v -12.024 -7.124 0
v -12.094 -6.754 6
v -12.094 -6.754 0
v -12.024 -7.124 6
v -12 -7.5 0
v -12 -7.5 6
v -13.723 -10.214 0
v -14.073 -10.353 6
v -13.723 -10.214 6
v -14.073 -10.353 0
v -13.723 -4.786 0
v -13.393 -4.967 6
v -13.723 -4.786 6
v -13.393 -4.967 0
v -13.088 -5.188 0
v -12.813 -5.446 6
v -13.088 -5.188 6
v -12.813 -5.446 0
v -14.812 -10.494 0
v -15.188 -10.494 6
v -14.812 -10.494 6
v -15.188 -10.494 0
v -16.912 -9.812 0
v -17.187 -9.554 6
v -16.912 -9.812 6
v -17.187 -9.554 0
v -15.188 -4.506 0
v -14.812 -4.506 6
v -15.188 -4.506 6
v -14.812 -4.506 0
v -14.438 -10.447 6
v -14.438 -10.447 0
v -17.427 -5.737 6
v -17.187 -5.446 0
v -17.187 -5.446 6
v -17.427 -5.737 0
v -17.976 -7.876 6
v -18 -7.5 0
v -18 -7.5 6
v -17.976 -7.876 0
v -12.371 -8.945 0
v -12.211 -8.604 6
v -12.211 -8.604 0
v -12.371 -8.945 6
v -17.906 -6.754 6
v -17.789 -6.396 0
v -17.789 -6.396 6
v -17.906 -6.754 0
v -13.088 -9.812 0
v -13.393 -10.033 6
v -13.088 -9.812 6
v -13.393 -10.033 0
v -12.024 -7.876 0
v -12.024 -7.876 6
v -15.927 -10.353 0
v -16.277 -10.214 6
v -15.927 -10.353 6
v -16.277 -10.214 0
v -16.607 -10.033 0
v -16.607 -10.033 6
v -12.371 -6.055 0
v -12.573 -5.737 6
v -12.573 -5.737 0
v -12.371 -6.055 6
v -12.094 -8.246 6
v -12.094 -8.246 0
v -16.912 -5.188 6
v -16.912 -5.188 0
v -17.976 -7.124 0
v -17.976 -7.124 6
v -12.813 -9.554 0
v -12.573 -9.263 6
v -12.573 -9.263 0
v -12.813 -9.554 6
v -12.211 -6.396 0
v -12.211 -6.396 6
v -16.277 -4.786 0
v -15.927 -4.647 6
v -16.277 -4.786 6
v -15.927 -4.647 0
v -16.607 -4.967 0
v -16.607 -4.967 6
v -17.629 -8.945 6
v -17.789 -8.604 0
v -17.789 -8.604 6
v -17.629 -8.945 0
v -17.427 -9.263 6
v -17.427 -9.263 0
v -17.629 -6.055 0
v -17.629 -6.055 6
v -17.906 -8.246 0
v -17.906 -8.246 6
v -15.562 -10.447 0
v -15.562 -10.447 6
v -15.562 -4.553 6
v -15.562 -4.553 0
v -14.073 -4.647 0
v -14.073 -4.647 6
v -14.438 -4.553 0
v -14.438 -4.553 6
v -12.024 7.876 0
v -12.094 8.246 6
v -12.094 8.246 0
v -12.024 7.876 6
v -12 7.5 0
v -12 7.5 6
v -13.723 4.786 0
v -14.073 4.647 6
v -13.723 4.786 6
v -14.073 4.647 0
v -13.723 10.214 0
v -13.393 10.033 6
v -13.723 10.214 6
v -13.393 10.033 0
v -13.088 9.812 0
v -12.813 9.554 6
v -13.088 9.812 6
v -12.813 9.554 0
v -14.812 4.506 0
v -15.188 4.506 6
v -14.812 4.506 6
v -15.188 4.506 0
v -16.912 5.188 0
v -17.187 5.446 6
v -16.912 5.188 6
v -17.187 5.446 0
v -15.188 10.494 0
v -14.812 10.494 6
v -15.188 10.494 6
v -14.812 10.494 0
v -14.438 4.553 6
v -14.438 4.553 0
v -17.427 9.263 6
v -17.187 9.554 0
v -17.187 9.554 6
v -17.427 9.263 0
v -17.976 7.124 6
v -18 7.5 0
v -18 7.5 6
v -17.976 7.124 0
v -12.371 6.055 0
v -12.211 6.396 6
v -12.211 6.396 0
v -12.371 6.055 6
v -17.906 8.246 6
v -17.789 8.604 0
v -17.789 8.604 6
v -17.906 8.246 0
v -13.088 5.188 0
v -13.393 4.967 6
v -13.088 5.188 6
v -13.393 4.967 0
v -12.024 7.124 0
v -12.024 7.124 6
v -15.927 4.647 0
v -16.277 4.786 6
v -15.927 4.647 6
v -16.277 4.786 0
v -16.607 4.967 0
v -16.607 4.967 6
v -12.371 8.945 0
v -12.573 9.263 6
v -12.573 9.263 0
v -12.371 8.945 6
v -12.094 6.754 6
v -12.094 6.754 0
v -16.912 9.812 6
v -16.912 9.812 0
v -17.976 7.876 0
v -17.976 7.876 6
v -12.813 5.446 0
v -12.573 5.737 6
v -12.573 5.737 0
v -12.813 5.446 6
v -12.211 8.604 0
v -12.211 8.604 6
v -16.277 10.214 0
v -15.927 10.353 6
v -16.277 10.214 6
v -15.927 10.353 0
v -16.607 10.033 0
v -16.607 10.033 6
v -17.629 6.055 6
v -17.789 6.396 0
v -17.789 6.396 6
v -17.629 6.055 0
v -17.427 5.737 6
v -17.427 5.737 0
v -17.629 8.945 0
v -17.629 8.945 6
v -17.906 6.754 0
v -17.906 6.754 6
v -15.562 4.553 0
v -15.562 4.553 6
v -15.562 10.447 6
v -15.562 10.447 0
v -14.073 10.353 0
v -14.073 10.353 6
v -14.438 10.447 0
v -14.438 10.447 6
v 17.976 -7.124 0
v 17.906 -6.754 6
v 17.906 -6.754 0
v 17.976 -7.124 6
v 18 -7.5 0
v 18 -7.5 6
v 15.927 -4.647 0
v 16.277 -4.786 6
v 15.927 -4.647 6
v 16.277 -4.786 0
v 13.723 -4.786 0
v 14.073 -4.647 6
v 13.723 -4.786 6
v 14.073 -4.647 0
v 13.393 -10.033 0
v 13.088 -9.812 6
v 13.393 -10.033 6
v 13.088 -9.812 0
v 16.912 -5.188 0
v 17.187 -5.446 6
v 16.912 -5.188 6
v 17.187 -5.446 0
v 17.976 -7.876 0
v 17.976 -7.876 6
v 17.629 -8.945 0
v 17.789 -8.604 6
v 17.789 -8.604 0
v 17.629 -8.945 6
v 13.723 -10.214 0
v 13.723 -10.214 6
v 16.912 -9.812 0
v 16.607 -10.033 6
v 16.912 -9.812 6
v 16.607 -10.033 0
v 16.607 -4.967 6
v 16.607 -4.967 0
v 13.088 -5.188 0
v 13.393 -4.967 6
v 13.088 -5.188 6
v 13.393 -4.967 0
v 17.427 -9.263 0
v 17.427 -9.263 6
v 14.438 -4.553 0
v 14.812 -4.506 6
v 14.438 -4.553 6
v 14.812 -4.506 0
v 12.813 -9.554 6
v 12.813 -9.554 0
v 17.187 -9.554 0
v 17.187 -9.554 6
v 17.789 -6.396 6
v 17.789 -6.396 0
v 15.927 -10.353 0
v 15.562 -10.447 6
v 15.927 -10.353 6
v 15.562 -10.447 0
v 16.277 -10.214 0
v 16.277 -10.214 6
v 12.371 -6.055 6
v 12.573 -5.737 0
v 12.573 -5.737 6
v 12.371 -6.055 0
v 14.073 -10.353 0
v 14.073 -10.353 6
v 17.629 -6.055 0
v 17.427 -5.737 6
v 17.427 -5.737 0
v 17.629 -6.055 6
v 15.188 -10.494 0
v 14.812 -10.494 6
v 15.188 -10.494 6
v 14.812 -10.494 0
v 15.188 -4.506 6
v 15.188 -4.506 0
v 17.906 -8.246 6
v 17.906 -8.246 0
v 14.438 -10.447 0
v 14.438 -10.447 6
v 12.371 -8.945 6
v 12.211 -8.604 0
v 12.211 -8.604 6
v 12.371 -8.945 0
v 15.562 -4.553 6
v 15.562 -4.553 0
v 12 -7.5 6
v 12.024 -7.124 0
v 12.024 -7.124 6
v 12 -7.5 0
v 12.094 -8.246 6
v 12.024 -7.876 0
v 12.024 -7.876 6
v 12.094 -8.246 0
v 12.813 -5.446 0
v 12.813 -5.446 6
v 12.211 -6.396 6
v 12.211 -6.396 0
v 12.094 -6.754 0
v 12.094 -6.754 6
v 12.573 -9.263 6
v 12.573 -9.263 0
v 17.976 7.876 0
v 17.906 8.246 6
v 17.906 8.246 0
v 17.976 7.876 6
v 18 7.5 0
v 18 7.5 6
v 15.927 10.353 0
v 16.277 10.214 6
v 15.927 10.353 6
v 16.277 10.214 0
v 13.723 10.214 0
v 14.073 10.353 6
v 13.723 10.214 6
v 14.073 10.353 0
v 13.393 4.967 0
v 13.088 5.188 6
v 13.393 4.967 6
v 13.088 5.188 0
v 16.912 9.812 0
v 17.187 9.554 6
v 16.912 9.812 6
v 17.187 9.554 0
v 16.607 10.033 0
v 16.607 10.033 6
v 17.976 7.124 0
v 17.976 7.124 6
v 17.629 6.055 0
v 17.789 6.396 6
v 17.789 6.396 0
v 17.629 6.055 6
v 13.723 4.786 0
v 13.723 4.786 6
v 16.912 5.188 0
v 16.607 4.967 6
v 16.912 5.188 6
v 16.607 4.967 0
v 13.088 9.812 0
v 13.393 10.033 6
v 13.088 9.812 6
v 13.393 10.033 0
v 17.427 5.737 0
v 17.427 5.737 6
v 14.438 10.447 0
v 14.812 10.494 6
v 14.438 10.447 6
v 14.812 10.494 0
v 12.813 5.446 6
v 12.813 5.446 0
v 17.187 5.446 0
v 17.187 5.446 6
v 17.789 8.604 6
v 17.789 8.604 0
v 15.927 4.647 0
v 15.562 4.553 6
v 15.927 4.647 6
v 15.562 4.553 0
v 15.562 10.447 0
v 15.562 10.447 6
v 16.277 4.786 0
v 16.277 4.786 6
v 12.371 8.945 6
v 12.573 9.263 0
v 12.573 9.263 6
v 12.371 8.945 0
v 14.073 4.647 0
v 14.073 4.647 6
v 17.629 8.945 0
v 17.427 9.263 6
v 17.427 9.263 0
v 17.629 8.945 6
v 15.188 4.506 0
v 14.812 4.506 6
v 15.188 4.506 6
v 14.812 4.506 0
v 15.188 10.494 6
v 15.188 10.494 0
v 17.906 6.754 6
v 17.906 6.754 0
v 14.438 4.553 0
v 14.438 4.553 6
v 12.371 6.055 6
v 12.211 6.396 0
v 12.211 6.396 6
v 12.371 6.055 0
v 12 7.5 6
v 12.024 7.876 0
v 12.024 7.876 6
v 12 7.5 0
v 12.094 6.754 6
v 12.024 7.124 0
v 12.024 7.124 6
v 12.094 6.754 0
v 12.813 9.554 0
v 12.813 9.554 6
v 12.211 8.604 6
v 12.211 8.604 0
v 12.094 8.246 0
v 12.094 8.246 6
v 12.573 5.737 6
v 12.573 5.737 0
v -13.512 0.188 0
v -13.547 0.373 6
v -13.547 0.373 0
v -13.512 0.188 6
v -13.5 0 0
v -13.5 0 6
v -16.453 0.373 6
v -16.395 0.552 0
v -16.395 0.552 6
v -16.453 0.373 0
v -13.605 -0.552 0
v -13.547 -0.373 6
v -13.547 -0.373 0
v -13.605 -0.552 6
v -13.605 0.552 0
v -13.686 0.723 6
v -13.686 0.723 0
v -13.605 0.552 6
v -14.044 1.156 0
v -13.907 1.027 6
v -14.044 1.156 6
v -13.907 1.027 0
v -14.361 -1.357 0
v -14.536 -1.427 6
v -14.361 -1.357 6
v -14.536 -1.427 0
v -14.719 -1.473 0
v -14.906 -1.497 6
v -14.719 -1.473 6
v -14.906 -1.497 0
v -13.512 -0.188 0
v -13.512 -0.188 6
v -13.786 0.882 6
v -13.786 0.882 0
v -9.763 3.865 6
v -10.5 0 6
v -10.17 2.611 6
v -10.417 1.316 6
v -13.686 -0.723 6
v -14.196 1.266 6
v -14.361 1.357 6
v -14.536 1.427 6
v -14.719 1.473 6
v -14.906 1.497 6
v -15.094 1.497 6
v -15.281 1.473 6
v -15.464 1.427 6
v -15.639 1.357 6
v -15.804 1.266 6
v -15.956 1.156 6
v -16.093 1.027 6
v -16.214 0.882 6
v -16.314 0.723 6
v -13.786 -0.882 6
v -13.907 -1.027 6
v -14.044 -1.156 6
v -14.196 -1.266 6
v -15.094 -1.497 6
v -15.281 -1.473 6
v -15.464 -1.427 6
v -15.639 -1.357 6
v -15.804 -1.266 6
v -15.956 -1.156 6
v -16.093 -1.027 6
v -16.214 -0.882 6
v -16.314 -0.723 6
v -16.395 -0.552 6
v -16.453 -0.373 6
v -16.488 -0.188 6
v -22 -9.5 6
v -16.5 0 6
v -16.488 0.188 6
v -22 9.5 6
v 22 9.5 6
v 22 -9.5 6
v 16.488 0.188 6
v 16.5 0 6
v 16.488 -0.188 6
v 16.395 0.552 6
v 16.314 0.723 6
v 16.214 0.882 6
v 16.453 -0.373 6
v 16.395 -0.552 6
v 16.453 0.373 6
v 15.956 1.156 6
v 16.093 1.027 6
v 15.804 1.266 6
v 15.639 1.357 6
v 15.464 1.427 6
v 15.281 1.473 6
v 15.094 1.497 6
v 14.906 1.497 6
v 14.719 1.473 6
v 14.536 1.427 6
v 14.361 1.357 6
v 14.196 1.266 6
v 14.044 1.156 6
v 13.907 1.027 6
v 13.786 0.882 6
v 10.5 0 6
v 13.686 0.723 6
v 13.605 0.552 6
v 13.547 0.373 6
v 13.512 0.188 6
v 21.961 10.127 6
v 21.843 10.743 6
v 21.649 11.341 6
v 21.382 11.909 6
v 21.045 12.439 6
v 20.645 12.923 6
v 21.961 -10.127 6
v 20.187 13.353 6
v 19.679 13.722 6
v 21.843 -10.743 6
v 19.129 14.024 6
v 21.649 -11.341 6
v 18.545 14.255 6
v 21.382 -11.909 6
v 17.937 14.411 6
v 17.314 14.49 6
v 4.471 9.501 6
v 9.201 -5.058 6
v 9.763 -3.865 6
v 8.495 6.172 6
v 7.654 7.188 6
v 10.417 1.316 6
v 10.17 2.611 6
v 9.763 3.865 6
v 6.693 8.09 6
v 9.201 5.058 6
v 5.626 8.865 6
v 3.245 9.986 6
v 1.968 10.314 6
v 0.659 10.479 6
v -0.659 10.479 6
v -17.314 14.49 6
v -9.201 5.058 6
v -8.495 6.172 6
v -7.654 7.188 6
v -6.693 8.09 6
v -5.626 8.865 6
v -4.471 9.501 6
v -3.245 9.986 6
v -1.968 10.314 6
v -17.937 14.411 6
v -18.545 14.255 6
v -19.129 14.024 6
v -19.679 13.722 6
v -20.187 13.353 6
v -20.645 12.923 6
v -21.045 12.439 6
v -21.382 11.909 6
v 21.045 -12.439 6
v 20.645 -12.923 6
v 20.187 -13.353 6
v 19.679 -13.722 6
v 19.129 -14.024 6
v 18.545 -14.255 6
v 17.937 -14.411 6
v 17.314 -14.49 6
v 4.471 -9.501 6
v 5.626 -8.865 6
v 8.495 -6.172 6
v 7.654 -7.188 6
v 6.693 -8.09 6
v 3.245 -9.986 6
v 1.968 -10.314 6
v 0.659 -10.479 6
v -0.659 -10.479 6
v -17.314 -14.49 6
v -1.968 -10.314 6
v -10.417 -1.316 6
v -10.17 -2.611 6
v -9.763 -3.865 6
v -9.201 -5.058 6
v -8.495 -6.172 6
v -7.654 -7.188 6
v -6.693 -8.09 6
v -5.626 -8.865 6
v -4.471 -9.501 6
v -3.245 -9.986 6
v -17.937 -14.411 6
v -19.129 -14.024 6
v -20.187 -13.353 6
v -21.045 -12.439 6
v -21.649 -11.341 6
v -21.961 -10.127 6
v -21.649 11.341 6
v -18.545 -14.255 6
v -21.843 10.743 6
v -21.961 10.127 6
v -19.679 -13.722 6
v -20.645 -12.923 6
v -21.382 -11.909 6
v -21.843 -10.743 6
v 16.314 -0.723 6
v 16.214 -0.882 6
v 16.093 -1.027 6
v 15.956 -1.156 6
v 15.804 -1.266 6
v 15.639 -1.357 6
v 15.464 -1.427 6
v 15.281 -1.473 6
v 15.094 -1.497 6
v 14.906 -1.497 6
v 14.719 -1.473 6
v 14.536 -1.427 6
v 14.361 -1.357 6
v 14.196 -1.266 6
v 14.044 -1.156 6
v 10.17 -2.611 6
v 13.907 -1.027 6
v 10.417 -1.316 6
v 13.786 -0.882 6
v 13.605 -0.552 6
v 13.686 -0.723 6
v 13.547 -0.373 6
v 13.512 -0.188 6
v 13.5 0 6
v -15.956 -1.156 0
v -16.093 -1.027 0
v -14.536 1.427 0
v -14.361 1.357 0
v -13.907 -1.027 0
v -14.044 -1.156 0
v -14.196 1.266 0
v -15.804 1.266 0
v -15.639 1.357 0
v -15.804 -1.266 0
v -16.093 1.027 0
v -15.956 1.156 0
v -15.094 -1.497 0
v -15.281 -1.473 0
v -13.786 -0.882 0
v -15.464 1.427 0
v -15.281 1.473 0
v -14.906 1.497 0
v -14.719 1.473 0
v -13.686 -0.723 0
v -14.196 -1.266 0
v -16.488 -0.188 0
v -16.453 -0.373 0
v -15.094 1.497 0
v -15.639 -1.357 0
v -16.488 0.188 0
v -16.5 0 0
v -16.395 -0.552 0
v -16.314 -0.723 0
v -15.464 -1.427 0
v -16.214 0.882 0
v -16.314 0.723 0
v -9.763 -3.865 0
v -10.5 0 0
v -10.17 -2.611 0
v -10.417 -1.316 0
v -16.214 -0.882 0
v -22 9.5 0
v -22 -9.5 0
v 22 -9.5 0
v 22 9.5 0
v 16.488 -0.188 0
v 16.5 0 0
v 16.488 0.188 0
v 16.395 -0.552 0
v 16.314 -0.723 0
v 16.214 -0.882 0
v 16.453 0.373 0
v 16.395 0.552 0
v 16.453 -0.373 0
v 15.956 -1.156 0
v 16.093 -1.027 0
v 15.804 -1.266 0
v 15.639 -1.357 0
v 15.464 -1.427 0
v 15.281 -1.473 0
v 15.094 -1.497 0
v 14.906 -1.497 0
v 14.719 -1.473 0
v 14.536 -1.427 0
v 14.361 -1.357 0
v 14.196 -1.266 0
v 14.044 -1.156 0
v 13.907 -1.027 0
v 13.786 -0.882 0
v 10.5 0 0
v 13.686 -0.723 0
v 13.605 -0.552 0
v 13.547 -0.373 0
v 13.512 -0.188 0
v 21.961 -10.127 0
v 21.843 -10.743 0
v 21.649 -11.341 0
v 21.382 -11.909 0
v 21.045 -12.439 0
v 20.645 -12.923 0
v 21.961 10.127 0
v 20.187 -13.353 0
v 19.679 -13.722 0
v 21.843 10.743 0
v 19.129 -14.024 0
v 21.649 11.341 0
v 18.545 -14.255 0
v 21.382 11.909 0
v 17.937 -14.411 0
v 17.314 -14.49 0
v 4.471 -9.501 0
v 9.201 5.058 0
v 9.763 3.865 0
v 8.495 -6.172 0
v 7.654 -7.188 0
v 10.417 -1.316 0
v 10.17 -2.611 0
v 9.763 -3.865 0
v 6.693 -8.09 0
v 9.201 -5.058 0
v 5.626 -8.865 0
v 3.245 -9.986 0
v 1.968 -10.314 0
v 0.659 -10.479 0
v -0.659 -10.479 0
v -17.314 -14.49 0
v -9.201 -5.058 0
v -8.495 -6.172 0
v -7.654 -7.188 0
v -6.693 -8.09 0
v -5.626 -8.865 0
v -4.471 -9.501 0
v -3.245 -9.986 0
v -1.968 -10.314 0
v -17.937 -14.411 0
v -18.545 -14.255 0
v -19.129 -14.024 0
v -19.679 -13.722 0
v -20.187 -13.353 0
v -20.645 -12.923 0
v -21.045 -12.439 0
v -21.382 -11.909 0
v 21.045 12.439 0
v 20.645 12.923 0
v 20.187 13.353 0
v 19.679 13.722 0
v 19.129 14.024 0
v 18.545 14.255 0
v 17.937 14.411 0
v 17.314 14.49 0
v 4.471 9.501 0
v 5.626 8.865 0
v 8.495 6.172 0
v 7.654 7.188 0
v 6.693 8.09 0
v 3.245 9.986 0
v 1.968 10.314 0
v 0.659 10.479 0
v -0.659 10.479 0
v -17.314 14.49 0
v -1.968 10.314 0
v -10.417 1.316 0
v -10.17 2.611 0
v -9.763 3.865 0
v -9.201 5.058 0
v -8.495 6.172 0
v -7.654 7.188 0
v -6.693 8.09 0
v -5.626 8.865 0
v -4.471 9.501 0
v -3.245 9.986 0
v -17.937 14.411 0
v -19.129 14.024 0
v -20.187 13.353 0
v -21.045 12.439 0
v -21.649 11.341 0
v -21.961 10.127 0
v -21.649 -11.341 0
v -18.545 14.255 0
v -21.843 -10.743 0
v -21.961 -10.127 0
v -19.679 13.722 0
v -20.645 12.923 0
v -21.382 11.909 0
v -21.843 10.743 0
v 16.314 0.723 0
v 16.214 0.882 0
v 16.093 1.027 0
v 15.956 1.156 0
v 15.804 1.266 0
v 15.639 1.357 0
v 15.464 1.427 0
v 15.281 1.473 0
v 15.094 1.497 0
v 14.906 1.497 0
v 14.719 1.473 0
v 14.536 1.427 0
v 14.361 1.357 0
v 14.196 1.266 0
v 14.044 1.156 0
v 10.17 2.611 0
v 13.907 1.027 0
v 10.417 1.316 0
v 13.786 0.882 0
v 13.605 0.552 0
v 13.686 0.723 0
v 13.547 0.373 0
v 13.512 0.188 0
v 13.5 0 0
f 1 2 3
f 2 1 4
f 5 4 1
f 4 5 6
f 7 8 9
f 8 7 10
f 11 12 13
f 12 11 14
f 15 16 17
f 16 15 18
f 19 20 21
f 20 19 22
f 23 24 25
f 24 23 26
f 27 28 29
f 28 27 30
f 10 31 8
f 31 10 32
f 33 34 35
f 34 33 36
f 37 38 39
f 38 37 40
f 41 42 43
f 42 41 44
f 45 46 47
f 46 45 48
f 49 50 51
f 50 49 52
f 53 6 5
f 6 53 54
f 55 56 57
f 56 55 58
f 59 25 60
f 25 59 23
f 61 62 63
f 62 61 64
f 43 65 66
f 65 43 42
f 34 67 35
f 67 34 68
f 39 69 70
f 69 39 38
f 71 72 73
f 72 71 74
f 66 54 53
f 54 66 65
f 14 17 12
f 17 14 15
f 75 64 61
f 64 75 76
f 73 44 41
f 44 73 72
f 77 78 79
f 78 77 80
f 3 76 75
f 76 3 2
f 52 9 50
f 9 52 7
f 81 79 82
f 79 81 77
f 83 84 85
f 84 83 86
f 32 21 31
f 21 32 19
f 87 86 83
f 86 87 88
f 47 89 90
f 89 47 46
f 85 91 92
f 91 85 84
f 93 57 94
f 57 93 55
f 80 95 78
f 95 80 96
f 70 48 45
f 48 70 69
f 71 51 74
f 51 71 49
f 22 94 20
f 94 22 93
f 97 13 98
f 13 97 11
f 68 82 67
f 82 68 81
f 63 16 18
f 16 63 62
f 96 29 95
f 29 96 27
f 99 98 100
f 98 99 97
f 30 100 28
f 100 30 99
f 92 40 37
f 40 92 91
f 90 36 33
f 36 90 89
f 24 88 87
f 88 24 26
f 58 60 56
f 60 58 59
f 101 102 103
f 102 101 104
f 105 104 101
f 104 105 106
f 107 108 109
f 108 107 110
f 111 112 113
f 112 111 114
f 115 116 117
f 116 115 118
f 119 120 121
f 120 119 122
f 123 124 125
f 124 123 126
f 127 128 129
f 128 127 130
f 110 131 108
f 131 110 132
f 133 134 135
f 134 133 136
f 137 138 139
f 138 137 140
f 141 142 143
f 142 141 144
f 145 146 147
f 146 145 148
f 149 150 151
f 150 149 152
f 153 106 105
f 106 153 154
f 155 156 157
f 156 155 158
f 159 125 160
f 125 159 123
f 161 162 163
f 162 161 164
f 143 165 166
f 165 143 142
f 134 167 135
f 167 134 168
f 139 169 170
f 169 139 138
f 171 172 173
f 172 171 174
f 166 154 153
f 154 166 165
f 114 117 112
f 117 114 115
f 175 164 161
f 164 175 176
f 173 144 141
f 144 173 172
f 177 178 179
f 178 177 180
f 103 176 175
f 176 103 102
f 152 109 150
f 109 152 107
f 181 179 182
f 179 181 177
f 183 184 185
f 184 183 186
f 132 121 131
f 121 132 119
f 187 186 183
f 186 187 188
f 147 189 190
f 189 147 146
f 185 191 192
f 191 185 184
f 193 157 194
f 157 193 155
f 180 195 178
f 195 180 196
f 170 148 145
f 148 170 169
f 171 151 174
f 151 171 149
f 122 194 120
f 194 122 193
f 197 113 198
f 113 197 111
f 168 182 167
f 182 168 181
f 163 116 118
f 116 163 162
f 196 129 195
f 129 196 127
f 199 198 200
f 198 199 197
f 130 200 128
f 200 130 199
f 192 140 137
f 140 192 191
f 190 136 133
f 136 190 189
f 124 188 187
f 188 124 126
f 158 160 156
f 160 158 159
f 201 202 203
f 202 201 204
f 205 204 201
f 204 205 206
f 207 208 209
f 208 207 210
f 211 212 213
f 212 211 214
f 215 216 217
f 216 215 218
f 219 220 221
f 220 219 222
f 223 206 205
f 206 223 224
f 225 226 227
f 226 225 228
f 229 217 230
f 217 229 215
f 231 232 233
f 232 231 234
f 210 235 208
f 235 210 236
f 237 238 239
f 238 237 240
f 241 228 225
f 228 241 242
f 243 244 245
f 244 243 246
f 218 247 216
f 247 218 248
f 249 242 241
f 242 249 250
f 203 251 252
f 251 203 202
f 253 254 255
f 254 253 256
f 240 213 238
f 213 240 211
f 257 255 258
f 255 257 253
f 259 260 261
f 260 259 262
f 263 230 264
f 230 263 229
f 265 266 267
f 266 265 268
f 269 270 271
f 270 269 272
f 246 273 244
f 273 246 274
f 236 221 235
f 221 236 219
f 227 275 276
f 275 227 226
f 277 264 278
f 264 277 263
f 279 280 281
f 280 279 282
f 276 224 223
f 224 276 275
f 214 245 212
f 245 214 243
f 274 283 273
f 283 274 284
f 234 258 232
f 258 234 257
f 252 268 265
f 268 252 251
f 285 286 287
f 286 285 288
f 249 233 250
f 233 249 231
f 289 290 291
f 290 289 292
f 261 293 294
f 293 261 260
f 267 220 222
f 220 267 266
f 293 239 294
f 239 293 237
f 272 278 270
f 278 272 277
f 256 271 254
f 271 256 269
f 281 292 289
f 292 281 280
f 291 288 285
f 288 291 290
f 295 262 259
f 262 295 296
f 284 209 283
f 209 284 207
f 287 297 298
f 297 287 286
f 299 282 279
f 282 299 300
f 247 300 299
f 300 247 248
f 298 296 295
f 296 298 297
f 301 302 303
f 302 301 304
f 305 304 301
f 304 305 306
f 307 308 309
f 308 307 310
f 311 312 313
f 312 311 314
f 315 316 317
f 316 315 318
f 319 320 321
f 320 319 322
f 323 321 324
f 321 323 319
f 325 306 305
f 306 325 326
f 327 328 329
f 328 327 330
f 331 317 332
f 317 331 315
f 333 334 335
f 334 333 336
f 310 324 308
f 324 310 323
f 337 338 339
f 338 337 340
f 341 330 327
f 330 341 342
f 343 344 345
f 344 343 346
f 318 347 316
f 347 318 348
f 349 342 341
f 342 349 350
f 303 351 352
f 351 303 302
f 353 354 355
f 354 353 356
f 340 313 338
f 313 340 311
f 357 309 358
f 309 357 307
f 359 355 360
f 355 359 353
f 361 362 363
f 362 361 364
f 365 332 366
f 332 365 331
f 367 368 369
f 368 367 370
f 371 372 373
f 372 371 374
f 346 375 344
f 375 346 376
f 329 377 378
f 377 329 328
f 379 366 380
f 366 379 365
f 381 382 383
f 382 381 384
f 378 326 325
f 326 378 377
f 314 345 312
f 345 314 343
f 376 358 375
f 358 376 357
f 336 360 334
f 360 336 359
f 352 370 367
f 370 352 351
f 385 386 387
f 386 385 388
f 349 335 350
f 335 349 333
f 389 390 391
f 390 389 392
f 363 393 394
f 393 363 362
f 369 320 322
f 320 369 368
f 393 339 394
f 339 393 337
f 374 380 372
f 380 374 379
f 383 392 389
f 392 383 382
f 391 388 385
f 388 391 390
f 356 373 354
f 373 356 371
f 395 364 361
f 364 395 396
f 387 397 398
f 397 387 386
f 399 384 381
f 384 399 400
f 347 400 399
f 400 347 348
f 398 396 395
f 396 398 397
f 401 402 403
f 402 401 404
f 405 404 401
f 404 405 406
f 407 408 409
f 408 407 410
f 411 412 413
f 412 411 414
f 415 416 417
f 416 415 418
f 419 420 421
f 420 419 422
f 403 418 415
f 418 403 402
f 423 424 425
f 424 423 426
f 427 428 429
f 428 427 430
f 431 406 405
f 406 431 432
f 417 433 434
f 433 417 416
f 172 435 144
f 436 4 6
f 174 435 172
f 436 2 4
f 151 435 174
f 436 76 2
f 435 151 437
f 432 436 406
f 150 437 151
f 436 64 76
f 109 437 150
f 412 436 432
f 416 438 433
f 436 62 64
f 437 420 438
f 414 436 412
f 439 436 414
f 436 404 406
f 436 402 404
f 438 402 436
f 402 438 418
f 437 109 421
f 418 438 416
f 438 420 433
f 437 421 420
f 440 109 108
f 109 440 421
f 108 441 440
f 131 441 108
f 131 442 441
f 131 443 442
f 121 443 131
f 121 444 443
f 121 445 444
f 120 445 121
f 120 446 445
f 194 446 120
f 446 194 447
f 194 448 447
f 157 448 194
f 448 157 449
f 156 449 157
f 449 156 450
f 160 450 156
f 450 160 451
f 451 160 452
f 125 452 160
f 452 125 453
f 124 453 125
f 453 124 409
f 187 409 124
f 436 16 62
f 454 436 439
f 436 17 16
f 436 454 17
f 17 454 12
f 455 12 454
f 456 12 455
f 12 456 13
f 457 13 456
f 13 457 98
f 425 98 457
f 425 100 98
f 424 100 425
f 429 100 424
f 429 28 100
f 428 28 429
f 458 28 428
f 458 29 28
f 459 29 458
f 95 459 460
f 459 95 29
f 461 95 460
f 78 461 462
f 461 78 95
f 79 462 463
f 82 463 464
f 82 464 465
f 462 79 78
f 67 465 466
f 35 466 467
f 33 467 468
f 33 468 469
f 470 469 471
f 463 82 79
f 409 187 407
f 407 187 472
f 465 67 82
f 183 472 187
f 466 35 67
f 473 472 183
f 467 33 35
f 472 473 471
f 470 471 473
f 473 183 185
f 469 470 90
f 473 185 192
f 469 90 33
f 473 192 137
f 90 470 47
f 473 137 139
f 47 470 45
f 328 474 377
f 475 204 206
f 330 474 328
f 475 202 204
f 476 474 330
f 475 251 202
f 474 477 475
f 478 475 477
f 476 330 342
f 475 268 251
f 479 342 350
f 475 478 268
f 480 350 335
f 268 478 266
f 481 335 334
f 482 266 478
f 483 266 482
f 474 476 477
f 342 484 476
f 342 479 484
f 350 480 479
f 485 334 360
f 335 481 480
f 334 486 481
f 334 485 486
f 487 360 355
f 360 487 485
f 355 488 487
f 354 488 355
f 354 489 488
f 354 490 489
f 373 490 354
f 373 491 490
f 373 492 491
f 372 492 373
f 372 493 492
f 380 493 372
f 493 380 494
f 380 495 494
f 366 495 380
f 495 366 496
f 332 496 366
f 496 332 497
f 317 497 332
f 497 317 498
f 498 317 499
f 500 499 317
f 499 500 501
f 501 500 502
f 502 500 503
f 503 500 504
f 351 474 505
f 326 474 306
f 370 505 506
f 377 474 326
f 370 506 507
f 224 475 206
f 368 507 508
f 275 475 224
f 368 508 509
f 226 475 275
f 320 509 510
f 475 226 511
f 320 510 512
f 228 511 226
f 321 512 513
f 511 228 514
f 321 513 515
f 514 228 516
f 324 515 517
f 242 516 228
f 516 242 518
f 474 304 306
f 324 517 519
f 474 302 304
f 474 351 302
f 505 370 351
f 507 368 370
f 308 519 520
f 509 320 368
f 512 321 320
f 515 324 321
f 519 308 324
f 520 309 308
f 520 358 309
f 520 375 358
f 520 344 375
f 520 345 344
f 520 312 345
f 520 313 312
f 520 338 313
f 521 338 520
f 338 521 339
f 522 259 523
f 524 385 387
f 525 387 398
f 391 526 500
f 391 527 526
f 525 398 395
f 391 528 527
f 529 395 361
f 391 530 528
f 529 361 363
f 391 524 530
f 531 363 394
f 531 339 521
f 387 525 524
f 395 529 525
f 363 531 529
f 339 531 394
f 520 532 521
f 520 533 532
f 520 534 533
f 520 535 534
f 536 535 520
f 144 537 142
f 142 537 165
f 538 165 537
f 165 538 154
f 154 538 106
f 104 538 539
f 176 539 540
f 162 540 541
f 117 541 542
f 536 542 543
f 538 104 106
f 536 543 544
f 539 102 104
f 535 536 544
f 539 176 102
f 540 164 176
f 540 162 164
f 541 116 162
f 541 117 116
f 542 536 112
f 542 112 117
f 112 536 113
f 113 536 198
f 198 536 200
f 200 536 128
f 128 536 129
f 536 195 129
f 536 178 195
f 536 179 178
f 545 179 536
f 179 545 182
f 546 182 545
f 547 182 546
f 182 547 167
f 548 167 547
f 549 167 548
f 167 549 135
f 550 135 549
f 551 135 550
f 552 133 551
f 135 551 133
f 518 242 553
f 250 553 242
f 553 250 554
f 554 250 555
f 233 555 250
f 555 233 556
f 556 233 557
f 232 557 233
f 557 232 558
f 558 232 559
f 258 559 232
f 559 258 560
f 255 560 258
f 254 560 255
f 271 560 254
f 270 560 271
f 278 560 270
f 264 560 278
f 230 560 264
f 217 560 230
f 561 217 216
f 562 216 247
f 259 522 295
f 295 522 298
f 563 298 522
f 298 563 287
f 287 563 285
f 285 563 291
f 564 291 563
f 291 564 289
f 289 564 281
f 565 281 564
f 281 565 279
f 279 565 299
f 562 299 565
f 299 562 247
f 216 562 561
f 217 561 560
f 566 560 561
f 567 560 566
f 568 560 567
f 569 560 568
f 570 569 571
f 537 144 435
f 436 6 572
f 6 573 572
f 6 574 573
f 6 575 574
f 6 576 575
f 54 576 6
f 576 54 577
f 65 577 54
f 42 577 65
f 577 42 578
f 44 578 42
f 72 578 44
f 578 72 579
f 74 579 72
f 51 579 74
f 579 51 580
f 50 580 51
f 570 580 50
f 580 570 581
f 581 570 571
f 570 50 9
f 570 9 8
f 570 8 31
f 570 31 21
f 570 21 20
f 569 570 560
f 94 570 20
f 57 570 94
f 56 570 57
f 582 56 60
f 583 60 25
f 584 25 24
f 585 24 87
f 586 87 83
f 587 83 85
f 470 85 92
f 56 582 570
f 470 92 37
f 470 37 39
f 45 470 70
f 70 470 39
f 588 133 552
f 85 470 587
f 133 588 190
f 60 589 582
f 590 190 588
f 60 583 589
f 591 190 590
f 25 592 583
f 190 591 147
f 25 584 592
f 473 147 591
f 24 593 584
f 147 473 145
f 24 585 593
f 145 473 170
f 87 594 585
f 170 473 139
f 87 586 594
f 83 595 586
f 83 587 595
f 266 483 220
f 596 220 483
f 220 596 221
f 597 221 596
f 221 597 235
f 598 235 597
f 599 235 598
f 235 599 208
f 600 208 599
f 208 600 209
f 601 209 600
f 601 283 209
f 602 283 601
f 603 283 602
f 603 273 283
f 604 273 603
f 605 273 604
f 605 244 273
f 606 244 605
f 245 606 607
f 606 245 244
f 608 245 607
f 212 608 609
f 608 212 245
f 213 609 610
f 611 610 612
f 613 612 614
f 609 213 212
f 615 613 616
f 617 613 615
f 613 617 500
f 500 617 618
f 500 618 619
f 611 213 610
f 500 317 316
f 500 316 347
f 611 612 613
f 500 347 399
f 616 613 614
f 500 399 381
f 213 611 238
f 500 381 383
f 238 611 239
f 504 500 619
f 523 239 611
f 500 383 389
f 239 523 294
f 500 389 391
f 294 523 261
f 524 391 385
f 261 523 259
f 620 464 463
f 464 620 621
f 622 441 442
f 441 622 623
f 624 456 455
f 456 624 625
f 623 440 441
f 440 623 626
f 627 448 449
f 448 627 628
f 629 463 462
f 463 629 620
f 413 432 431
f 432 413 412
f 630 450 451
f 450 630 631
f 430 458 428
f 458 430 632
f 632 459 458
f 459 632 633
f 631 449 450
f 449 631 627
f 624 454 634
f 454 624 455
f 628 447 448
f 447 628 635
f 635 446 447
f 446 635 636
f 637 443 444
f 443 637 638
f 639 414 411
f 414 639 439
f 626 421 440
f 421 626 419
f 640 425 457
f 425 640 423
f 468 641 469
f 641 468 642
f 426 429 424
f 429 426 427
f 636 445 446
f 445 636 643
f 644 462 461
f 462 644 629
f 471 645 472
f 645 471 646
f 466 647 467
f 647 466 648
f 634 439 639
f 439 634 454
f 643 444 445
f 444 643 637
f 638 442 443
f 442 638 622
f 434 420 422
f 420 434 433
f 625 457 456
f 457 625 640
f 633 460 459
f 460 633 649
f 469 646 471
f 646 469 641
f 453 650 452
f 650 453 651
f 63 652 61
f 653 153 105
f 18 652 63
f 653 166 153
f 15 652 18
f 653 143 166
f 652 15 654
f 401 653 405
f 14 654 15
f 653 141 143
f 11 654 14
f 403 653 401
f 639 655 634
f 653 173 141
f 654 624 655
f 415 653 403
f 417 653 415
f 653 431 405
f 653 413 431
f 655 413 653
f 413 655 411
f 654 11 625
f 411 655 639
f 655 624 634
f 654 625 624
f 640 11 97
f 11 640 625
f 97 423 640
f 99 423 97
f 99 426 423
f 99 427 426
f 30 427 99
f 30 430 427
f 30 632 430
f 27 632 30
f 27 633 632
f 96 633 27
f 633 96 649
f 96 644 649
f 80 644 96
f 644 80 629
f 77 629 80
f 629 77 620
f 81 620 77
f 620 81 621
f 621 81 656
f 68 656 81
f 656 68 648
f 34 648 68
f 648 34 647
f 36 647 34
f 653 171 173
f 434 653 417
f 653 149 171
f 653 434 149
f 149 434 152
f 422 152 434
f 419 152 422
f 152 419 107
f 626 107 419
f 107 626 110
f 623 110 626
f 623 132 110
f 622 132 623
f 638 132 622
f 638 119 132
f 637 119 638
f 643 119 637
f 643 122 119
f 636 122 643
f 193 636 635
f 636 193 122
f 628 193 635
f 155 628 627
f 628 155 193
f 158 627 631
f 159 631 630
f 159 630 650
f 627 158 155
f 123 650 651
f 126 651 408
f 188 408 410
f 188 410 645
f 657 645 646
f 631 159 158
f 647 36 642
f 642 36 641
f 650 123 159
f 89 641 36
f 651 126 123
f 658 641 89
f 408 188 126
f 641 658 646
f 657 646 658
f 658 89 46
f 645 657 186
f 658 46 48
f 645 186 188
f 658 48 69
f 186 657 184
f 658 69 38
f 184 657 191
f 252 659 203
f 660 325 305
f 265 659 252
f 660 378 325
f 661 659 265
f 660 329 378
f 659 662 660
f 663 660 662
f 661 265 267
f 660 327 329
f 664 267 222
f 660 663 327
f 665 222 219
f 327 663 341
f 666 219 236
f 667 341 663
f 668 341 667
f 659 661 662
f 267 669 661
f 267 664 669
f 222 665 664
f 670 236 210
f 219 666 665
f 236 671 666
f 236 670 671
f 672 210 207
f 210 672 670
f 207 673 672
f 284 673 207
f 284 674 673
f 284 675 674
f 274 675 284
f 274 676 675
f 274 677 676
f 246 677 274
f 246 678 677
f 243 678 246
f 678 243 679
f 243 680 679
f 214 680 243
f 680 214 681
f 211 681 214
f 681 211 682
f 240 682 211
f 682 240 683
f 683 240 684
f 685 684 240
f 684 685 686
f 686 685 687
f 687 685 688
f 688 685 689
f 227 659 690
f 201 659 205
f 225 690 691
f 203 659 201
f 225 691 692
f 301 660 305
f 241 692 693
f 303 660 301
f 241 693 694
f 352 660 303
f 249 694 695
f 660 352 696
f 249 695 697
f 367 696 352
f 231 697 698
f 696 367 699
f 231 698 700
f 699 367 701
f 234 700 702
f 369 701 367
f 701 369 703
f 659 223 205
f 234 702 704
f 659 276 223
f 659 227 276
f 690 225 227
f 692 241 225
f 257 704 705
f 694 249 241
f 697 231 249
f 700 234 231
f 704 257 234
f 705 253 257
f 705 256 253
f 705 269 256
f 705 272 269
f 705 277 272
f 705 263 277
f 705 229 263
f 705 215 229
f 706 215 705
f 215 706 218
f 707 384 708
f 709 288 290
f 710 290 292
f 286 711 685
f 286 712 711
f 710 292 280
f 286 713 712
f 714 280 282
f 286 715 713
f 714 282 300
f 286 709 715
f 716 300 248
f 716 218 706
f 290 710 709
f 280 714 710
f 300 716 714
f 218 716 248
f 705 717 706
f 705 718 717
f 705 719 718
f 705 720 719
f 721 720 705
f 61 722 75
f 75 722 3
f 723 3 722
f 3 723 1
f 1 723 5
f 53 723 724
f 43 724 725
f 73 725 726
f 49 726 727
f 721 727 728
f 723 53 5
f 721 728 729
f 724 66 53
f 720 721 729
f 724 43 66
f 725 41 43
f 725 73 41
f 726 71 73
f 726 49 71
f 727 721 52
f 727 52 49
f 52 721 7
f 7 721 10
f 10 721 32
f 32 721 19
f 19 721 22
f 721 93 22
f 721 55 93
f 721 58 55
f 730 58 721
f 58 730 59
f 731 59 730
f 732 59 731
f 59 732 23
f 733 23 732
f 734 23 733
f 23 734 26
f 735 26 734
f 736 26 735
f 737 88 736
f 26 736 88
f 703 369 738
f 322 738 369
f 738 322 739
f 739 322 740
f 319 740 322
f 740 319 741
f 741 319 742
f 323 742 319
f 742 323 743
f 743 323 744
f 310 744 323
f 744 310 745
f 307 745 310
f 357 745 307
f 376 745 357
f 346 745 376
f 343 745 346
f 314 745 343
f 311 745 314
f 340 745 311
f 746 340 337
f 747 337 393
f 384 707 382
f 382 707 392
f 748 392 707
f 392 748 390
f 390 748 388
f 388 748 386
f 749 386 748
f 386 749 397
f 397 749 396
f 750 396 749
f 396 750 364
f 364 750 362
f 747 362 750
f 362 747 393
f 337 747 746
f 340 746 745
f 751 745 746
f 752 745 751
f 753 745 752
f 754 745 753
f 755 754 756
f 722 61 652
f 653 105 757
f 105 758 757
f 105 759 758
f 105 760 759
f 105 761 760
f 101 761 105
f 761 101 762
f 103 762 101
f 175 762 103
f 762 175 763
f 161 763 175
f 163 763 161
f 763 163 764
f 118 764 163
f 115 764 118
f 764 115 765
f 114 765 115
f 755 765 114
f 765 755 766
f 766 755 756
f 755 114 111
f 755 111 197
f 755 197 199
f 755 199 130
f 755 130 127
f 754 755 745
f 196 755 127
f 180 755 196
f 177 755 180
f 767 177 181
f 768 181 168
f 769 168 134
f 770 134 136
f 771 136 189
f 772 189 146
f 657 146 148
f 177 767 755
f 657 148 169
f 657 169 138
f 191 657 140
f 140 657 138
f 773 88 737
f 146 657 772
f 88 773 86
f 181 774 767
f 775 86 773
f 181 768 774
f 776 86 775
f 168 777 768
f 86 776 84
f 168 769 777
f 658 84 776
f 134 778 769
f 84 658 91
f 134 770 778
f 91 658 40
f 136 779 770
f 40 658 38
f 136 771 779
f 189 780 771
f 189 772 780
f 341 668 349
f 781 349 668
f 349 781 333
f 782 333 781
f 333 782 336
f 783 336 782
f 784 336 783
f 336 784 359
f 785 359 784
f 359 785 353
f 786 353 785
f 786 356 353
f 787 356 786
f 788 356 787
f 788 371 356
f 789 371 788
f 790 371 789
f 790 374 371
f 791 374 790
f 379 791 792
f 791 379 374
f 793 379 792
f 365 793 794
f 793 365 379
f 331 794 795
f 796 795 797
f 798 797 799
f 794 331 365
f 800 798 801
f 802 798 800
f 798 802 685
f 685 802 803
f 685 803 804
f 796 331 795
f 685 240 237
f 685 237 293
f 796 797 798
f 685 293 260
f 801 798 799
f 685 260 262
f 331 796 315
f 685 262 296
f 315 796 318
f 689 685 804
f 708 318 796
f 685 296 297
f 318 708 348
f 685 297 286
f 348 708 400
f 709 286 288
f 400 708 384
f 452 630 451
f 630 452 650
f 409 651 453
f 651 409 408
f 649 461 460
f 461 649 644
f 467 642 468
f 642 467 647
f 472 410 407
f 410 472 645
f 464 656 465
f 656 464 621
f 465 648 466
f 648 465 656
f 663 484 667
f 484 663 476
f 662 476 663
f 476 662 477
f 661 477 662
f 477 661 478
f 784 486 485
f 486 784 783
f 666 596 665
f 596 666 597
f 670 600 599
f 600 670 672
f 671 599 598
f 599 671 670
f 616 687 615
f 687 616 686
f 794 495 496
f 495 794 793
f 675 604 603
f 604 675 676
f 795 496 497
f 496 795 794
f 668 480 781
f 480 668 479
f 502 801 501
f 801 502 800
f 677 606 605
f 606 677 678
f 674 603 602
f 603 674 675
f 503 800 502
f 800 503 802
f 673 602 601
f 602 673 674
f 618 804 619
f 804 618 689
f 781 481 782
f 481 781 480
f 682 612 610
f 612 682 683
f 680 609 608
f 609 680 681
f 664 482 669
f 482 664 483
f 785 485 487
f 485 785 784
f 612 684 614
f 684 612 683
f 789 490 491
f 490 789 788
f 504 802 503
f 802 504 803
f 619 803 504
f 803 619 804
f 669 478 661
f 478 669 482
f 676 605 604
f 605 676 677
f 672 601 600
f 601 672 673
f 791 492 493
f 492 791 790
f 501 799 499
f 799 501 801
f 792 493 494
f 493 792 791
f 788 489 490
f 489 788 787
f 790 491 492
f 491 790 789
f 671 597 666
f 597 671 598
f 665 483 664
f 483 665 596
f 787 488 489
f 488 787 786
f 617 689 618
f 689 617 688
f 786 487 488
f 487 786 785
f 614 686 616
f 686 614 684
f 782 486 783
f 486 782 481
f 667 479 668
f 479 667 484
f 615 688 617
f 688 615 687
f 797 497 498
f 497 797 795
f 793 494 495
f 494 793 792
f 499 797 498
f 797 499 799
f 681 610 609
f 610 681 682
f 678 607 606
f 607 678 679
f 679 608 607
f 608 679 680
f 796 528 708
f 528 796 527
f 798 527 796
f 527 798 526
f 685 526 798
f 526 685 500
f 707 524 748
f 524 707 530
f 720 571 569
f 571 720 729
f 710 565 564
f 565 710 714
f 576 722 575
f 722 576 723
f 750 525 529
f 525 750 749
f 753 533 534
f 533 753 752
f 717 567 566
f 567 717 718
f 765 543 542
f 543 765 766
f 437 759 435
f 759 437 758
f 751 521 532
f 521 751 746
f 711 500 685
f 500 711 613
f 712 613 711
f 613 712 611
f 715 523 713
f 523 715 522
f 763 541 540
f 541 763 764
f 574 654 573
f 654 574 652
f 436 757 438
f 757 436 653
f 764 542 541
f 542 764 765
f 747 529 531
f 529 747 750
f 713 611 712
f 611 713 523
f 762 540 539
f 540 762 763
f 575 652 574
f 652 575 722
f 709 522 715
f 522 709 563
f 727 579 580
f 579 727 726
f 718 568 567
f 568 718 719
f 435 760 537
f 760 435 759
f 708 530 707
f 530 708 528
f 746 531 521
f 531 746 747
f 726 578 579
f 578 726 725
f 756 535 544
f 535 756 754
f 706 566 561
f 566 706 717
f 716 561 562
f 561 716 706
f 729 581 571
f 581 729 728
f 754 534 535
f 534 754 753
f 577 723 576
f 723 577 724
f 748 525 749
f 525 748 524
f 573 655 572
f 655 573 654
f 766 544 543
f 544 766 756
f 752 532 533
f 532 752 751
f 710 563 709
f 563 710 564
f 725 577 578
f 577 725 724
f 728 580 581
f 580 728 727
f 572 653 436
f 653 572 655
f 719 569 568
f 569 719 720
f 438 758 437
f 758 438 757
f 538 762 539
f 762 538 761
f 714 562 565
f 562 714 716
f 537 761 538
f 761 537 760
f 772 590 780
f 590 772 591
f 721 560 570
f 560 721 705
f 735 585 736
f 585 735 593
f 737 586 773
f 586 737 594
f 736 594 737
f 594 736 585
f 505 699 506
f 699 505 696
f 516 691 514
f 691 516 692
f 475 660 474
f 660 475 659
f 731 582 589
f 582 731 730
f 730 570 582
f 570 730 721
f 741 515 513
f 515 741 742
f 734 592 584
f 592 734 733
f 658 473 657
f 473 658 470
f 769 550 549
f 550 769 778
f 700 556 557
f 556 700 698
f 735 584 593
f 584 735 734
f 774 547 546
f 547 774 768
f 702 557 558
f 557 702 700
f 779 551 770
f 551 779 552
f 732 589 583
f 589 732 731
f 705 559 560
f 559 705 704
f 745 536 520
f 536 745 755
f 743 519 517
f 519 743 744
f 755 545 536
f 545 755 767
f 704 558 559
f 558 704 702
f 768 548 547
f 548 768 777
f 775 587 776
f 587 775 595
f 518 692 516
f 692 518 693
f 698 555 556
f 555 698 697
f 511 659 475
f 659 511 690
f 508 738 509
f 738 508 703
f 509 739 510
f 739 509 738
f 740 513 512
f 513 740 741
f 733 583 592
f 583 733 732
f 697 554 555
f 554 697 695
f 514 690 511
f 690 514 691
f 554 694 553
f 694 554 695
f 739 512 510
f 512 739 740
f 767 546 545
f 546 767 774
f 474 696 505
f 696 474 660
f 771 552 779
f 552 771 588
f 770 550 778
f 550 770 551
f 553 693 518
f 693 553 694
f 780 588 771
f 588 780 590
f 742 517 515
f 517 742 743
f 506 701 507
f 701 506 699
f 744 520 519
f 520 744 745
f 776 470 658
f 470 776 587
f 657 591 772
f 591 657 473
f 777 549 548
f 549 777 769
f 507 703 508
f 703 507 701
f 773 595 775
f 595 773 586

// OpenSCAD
$fn = 50;


difference() {
	union() {
		hull() {
			translate(v = [-17.0000000000, 9.5000000000, 0]) {
				cylinder(h = 6, r = 5);
			}
			translate(v = [17.0000000000, 9.5000000000, 0]) {
				cylinder(h = 6, r = 5);
			}
			translate(v = [-17.0000000000, -9.5000000000, 0]) {
				cylinder(h = 6, r = 5);
			}
			translate(v = [17.0000000000, -9.5000000000, 0]) {
				cylinder(h = 6, r = 5);
			}
		}
	}
	union() {
		#translate(v = [-15.0000000000, -7.5000000000, 0]) {
			cylinder(h = 6, r = 3.0000000000);
		}
		#translate(v = [-15.0000000000, 7.5000000000, 0]) {
			cylinder(h = 6, r = 3.0000000000);
		}
		#translate(v = [15.0000000000, -7.5000000000, 0]) {
			cylinder(h = 6, r = 3.0000000000);
		}
		#translate(v = [15.0000000000, 7.5000000000, 0]) {
			cylinder(h = 6, r = 3.0000000000);
		}
		#translate(v = [-15.0000000000, -7.5000000000, -100.0000000000]) {
			cylinder(h = 200, r = 3.0000000000);
		}
		#translate(v = [-15.0000000000, 7.5000000000, -100.0000000000]) {
			cylinder(h = 200, r = 3.0000000000);
		}
		#translate(v = [15.0000000000, -7.5000000000, -100.0000000000]) {
			cylinder(h = 200, r = 3.0000000000);
		}
		#translate(v = [15.0000000000, 7.5000000000, -100.0000000000]) {
			cylinder(h = 200, r = 3.0000000000);
		}
		#translate(v = [-15.0000000000, -7.5000000000, 0]) {
			cylinder(h = 6, r = 1.5000000000);
		}
		#translate(v = [-15.0000000000, 0.0000000000, 0]) {
			cylinder(h = 6, r = 1.5000000000);
		}
		#translate(v = [-15.0000000000, 7.5000000000, 0]) {
			cylinder(h = 6, r = 1.5000000000);
		}
		#translate(v = [15.0000000000, -7.5000000000, 0]) {
			cylinder(h = 6, r = 1.5000000000);
		}
		#translate(v = [15.0000000000, 0.0000000000, 0]) {
			cylinder(h = 6, r = 1.5000000000);
		}
		#translate(v = [15.0000000000, 7.5000000000, 0]) {
			cylinder(h = 6, r = 1.5000000000);
		}
		#translate(v = [-15.0000000000, -7.5000000000, 0]) {
			cylinder(h = 6, r = 1.5000000000);
		}
		#translate(v = [-15.0000000000, 0.0000000000, 0]) {
			cylinder(h = 6, r = 1.5000000000);
		}
		#translate(v = [-15.0000000000, 7.5000000000, 0]) {
			cylinder(h = 6, r = 1.5000000000);
		}
		#translate(v = [15.0000000000, -7.5000000000, 0]) {
			cylinder(h = 6, r = 1.5000000000);
		}
		#translate(v = [15.0000000000, 0.0000000000, 0]) {
			cylinder(h = 6, r = 1.5000000000);
		}
		#translate(v = [15.0000000000, 7.5000000000, 0]) {
			cylinder(h = 6, r = 1.5000000000);
		}
		#translate(v = [-15.0000000000, -7.5000000000, 0]) {
			cylinder(h = 6, r = 1.5000000000);
		}
		#translate(v = [-15.0000000000, 0.0000000000, 0]) {
			cylinder(h = 6, r = 1.5000000000);
		}
		#translate(v = [-15.0000000000, 7.5000000000, 0]) {
			cylinder(h = 6, r = 1.5000000000);
		}
		#translate(v = [15.0000000000, -7.5000000000, 0]) {
			cylinder(h = 6, r = 1.5000000000);
		}
		#translate(v = [15.0000000000, 0.0000000000, 0]) {
			cylinder(h = 6, r = 1.5000000000);
		}
		#translate(v = [15.0000000000, 7.5000000000, 0]) {
			cylinder(h = 6, r = 1.5000000000);
		}
		#cylinder(h = 6, r = 10.5000000000);
	}
}
